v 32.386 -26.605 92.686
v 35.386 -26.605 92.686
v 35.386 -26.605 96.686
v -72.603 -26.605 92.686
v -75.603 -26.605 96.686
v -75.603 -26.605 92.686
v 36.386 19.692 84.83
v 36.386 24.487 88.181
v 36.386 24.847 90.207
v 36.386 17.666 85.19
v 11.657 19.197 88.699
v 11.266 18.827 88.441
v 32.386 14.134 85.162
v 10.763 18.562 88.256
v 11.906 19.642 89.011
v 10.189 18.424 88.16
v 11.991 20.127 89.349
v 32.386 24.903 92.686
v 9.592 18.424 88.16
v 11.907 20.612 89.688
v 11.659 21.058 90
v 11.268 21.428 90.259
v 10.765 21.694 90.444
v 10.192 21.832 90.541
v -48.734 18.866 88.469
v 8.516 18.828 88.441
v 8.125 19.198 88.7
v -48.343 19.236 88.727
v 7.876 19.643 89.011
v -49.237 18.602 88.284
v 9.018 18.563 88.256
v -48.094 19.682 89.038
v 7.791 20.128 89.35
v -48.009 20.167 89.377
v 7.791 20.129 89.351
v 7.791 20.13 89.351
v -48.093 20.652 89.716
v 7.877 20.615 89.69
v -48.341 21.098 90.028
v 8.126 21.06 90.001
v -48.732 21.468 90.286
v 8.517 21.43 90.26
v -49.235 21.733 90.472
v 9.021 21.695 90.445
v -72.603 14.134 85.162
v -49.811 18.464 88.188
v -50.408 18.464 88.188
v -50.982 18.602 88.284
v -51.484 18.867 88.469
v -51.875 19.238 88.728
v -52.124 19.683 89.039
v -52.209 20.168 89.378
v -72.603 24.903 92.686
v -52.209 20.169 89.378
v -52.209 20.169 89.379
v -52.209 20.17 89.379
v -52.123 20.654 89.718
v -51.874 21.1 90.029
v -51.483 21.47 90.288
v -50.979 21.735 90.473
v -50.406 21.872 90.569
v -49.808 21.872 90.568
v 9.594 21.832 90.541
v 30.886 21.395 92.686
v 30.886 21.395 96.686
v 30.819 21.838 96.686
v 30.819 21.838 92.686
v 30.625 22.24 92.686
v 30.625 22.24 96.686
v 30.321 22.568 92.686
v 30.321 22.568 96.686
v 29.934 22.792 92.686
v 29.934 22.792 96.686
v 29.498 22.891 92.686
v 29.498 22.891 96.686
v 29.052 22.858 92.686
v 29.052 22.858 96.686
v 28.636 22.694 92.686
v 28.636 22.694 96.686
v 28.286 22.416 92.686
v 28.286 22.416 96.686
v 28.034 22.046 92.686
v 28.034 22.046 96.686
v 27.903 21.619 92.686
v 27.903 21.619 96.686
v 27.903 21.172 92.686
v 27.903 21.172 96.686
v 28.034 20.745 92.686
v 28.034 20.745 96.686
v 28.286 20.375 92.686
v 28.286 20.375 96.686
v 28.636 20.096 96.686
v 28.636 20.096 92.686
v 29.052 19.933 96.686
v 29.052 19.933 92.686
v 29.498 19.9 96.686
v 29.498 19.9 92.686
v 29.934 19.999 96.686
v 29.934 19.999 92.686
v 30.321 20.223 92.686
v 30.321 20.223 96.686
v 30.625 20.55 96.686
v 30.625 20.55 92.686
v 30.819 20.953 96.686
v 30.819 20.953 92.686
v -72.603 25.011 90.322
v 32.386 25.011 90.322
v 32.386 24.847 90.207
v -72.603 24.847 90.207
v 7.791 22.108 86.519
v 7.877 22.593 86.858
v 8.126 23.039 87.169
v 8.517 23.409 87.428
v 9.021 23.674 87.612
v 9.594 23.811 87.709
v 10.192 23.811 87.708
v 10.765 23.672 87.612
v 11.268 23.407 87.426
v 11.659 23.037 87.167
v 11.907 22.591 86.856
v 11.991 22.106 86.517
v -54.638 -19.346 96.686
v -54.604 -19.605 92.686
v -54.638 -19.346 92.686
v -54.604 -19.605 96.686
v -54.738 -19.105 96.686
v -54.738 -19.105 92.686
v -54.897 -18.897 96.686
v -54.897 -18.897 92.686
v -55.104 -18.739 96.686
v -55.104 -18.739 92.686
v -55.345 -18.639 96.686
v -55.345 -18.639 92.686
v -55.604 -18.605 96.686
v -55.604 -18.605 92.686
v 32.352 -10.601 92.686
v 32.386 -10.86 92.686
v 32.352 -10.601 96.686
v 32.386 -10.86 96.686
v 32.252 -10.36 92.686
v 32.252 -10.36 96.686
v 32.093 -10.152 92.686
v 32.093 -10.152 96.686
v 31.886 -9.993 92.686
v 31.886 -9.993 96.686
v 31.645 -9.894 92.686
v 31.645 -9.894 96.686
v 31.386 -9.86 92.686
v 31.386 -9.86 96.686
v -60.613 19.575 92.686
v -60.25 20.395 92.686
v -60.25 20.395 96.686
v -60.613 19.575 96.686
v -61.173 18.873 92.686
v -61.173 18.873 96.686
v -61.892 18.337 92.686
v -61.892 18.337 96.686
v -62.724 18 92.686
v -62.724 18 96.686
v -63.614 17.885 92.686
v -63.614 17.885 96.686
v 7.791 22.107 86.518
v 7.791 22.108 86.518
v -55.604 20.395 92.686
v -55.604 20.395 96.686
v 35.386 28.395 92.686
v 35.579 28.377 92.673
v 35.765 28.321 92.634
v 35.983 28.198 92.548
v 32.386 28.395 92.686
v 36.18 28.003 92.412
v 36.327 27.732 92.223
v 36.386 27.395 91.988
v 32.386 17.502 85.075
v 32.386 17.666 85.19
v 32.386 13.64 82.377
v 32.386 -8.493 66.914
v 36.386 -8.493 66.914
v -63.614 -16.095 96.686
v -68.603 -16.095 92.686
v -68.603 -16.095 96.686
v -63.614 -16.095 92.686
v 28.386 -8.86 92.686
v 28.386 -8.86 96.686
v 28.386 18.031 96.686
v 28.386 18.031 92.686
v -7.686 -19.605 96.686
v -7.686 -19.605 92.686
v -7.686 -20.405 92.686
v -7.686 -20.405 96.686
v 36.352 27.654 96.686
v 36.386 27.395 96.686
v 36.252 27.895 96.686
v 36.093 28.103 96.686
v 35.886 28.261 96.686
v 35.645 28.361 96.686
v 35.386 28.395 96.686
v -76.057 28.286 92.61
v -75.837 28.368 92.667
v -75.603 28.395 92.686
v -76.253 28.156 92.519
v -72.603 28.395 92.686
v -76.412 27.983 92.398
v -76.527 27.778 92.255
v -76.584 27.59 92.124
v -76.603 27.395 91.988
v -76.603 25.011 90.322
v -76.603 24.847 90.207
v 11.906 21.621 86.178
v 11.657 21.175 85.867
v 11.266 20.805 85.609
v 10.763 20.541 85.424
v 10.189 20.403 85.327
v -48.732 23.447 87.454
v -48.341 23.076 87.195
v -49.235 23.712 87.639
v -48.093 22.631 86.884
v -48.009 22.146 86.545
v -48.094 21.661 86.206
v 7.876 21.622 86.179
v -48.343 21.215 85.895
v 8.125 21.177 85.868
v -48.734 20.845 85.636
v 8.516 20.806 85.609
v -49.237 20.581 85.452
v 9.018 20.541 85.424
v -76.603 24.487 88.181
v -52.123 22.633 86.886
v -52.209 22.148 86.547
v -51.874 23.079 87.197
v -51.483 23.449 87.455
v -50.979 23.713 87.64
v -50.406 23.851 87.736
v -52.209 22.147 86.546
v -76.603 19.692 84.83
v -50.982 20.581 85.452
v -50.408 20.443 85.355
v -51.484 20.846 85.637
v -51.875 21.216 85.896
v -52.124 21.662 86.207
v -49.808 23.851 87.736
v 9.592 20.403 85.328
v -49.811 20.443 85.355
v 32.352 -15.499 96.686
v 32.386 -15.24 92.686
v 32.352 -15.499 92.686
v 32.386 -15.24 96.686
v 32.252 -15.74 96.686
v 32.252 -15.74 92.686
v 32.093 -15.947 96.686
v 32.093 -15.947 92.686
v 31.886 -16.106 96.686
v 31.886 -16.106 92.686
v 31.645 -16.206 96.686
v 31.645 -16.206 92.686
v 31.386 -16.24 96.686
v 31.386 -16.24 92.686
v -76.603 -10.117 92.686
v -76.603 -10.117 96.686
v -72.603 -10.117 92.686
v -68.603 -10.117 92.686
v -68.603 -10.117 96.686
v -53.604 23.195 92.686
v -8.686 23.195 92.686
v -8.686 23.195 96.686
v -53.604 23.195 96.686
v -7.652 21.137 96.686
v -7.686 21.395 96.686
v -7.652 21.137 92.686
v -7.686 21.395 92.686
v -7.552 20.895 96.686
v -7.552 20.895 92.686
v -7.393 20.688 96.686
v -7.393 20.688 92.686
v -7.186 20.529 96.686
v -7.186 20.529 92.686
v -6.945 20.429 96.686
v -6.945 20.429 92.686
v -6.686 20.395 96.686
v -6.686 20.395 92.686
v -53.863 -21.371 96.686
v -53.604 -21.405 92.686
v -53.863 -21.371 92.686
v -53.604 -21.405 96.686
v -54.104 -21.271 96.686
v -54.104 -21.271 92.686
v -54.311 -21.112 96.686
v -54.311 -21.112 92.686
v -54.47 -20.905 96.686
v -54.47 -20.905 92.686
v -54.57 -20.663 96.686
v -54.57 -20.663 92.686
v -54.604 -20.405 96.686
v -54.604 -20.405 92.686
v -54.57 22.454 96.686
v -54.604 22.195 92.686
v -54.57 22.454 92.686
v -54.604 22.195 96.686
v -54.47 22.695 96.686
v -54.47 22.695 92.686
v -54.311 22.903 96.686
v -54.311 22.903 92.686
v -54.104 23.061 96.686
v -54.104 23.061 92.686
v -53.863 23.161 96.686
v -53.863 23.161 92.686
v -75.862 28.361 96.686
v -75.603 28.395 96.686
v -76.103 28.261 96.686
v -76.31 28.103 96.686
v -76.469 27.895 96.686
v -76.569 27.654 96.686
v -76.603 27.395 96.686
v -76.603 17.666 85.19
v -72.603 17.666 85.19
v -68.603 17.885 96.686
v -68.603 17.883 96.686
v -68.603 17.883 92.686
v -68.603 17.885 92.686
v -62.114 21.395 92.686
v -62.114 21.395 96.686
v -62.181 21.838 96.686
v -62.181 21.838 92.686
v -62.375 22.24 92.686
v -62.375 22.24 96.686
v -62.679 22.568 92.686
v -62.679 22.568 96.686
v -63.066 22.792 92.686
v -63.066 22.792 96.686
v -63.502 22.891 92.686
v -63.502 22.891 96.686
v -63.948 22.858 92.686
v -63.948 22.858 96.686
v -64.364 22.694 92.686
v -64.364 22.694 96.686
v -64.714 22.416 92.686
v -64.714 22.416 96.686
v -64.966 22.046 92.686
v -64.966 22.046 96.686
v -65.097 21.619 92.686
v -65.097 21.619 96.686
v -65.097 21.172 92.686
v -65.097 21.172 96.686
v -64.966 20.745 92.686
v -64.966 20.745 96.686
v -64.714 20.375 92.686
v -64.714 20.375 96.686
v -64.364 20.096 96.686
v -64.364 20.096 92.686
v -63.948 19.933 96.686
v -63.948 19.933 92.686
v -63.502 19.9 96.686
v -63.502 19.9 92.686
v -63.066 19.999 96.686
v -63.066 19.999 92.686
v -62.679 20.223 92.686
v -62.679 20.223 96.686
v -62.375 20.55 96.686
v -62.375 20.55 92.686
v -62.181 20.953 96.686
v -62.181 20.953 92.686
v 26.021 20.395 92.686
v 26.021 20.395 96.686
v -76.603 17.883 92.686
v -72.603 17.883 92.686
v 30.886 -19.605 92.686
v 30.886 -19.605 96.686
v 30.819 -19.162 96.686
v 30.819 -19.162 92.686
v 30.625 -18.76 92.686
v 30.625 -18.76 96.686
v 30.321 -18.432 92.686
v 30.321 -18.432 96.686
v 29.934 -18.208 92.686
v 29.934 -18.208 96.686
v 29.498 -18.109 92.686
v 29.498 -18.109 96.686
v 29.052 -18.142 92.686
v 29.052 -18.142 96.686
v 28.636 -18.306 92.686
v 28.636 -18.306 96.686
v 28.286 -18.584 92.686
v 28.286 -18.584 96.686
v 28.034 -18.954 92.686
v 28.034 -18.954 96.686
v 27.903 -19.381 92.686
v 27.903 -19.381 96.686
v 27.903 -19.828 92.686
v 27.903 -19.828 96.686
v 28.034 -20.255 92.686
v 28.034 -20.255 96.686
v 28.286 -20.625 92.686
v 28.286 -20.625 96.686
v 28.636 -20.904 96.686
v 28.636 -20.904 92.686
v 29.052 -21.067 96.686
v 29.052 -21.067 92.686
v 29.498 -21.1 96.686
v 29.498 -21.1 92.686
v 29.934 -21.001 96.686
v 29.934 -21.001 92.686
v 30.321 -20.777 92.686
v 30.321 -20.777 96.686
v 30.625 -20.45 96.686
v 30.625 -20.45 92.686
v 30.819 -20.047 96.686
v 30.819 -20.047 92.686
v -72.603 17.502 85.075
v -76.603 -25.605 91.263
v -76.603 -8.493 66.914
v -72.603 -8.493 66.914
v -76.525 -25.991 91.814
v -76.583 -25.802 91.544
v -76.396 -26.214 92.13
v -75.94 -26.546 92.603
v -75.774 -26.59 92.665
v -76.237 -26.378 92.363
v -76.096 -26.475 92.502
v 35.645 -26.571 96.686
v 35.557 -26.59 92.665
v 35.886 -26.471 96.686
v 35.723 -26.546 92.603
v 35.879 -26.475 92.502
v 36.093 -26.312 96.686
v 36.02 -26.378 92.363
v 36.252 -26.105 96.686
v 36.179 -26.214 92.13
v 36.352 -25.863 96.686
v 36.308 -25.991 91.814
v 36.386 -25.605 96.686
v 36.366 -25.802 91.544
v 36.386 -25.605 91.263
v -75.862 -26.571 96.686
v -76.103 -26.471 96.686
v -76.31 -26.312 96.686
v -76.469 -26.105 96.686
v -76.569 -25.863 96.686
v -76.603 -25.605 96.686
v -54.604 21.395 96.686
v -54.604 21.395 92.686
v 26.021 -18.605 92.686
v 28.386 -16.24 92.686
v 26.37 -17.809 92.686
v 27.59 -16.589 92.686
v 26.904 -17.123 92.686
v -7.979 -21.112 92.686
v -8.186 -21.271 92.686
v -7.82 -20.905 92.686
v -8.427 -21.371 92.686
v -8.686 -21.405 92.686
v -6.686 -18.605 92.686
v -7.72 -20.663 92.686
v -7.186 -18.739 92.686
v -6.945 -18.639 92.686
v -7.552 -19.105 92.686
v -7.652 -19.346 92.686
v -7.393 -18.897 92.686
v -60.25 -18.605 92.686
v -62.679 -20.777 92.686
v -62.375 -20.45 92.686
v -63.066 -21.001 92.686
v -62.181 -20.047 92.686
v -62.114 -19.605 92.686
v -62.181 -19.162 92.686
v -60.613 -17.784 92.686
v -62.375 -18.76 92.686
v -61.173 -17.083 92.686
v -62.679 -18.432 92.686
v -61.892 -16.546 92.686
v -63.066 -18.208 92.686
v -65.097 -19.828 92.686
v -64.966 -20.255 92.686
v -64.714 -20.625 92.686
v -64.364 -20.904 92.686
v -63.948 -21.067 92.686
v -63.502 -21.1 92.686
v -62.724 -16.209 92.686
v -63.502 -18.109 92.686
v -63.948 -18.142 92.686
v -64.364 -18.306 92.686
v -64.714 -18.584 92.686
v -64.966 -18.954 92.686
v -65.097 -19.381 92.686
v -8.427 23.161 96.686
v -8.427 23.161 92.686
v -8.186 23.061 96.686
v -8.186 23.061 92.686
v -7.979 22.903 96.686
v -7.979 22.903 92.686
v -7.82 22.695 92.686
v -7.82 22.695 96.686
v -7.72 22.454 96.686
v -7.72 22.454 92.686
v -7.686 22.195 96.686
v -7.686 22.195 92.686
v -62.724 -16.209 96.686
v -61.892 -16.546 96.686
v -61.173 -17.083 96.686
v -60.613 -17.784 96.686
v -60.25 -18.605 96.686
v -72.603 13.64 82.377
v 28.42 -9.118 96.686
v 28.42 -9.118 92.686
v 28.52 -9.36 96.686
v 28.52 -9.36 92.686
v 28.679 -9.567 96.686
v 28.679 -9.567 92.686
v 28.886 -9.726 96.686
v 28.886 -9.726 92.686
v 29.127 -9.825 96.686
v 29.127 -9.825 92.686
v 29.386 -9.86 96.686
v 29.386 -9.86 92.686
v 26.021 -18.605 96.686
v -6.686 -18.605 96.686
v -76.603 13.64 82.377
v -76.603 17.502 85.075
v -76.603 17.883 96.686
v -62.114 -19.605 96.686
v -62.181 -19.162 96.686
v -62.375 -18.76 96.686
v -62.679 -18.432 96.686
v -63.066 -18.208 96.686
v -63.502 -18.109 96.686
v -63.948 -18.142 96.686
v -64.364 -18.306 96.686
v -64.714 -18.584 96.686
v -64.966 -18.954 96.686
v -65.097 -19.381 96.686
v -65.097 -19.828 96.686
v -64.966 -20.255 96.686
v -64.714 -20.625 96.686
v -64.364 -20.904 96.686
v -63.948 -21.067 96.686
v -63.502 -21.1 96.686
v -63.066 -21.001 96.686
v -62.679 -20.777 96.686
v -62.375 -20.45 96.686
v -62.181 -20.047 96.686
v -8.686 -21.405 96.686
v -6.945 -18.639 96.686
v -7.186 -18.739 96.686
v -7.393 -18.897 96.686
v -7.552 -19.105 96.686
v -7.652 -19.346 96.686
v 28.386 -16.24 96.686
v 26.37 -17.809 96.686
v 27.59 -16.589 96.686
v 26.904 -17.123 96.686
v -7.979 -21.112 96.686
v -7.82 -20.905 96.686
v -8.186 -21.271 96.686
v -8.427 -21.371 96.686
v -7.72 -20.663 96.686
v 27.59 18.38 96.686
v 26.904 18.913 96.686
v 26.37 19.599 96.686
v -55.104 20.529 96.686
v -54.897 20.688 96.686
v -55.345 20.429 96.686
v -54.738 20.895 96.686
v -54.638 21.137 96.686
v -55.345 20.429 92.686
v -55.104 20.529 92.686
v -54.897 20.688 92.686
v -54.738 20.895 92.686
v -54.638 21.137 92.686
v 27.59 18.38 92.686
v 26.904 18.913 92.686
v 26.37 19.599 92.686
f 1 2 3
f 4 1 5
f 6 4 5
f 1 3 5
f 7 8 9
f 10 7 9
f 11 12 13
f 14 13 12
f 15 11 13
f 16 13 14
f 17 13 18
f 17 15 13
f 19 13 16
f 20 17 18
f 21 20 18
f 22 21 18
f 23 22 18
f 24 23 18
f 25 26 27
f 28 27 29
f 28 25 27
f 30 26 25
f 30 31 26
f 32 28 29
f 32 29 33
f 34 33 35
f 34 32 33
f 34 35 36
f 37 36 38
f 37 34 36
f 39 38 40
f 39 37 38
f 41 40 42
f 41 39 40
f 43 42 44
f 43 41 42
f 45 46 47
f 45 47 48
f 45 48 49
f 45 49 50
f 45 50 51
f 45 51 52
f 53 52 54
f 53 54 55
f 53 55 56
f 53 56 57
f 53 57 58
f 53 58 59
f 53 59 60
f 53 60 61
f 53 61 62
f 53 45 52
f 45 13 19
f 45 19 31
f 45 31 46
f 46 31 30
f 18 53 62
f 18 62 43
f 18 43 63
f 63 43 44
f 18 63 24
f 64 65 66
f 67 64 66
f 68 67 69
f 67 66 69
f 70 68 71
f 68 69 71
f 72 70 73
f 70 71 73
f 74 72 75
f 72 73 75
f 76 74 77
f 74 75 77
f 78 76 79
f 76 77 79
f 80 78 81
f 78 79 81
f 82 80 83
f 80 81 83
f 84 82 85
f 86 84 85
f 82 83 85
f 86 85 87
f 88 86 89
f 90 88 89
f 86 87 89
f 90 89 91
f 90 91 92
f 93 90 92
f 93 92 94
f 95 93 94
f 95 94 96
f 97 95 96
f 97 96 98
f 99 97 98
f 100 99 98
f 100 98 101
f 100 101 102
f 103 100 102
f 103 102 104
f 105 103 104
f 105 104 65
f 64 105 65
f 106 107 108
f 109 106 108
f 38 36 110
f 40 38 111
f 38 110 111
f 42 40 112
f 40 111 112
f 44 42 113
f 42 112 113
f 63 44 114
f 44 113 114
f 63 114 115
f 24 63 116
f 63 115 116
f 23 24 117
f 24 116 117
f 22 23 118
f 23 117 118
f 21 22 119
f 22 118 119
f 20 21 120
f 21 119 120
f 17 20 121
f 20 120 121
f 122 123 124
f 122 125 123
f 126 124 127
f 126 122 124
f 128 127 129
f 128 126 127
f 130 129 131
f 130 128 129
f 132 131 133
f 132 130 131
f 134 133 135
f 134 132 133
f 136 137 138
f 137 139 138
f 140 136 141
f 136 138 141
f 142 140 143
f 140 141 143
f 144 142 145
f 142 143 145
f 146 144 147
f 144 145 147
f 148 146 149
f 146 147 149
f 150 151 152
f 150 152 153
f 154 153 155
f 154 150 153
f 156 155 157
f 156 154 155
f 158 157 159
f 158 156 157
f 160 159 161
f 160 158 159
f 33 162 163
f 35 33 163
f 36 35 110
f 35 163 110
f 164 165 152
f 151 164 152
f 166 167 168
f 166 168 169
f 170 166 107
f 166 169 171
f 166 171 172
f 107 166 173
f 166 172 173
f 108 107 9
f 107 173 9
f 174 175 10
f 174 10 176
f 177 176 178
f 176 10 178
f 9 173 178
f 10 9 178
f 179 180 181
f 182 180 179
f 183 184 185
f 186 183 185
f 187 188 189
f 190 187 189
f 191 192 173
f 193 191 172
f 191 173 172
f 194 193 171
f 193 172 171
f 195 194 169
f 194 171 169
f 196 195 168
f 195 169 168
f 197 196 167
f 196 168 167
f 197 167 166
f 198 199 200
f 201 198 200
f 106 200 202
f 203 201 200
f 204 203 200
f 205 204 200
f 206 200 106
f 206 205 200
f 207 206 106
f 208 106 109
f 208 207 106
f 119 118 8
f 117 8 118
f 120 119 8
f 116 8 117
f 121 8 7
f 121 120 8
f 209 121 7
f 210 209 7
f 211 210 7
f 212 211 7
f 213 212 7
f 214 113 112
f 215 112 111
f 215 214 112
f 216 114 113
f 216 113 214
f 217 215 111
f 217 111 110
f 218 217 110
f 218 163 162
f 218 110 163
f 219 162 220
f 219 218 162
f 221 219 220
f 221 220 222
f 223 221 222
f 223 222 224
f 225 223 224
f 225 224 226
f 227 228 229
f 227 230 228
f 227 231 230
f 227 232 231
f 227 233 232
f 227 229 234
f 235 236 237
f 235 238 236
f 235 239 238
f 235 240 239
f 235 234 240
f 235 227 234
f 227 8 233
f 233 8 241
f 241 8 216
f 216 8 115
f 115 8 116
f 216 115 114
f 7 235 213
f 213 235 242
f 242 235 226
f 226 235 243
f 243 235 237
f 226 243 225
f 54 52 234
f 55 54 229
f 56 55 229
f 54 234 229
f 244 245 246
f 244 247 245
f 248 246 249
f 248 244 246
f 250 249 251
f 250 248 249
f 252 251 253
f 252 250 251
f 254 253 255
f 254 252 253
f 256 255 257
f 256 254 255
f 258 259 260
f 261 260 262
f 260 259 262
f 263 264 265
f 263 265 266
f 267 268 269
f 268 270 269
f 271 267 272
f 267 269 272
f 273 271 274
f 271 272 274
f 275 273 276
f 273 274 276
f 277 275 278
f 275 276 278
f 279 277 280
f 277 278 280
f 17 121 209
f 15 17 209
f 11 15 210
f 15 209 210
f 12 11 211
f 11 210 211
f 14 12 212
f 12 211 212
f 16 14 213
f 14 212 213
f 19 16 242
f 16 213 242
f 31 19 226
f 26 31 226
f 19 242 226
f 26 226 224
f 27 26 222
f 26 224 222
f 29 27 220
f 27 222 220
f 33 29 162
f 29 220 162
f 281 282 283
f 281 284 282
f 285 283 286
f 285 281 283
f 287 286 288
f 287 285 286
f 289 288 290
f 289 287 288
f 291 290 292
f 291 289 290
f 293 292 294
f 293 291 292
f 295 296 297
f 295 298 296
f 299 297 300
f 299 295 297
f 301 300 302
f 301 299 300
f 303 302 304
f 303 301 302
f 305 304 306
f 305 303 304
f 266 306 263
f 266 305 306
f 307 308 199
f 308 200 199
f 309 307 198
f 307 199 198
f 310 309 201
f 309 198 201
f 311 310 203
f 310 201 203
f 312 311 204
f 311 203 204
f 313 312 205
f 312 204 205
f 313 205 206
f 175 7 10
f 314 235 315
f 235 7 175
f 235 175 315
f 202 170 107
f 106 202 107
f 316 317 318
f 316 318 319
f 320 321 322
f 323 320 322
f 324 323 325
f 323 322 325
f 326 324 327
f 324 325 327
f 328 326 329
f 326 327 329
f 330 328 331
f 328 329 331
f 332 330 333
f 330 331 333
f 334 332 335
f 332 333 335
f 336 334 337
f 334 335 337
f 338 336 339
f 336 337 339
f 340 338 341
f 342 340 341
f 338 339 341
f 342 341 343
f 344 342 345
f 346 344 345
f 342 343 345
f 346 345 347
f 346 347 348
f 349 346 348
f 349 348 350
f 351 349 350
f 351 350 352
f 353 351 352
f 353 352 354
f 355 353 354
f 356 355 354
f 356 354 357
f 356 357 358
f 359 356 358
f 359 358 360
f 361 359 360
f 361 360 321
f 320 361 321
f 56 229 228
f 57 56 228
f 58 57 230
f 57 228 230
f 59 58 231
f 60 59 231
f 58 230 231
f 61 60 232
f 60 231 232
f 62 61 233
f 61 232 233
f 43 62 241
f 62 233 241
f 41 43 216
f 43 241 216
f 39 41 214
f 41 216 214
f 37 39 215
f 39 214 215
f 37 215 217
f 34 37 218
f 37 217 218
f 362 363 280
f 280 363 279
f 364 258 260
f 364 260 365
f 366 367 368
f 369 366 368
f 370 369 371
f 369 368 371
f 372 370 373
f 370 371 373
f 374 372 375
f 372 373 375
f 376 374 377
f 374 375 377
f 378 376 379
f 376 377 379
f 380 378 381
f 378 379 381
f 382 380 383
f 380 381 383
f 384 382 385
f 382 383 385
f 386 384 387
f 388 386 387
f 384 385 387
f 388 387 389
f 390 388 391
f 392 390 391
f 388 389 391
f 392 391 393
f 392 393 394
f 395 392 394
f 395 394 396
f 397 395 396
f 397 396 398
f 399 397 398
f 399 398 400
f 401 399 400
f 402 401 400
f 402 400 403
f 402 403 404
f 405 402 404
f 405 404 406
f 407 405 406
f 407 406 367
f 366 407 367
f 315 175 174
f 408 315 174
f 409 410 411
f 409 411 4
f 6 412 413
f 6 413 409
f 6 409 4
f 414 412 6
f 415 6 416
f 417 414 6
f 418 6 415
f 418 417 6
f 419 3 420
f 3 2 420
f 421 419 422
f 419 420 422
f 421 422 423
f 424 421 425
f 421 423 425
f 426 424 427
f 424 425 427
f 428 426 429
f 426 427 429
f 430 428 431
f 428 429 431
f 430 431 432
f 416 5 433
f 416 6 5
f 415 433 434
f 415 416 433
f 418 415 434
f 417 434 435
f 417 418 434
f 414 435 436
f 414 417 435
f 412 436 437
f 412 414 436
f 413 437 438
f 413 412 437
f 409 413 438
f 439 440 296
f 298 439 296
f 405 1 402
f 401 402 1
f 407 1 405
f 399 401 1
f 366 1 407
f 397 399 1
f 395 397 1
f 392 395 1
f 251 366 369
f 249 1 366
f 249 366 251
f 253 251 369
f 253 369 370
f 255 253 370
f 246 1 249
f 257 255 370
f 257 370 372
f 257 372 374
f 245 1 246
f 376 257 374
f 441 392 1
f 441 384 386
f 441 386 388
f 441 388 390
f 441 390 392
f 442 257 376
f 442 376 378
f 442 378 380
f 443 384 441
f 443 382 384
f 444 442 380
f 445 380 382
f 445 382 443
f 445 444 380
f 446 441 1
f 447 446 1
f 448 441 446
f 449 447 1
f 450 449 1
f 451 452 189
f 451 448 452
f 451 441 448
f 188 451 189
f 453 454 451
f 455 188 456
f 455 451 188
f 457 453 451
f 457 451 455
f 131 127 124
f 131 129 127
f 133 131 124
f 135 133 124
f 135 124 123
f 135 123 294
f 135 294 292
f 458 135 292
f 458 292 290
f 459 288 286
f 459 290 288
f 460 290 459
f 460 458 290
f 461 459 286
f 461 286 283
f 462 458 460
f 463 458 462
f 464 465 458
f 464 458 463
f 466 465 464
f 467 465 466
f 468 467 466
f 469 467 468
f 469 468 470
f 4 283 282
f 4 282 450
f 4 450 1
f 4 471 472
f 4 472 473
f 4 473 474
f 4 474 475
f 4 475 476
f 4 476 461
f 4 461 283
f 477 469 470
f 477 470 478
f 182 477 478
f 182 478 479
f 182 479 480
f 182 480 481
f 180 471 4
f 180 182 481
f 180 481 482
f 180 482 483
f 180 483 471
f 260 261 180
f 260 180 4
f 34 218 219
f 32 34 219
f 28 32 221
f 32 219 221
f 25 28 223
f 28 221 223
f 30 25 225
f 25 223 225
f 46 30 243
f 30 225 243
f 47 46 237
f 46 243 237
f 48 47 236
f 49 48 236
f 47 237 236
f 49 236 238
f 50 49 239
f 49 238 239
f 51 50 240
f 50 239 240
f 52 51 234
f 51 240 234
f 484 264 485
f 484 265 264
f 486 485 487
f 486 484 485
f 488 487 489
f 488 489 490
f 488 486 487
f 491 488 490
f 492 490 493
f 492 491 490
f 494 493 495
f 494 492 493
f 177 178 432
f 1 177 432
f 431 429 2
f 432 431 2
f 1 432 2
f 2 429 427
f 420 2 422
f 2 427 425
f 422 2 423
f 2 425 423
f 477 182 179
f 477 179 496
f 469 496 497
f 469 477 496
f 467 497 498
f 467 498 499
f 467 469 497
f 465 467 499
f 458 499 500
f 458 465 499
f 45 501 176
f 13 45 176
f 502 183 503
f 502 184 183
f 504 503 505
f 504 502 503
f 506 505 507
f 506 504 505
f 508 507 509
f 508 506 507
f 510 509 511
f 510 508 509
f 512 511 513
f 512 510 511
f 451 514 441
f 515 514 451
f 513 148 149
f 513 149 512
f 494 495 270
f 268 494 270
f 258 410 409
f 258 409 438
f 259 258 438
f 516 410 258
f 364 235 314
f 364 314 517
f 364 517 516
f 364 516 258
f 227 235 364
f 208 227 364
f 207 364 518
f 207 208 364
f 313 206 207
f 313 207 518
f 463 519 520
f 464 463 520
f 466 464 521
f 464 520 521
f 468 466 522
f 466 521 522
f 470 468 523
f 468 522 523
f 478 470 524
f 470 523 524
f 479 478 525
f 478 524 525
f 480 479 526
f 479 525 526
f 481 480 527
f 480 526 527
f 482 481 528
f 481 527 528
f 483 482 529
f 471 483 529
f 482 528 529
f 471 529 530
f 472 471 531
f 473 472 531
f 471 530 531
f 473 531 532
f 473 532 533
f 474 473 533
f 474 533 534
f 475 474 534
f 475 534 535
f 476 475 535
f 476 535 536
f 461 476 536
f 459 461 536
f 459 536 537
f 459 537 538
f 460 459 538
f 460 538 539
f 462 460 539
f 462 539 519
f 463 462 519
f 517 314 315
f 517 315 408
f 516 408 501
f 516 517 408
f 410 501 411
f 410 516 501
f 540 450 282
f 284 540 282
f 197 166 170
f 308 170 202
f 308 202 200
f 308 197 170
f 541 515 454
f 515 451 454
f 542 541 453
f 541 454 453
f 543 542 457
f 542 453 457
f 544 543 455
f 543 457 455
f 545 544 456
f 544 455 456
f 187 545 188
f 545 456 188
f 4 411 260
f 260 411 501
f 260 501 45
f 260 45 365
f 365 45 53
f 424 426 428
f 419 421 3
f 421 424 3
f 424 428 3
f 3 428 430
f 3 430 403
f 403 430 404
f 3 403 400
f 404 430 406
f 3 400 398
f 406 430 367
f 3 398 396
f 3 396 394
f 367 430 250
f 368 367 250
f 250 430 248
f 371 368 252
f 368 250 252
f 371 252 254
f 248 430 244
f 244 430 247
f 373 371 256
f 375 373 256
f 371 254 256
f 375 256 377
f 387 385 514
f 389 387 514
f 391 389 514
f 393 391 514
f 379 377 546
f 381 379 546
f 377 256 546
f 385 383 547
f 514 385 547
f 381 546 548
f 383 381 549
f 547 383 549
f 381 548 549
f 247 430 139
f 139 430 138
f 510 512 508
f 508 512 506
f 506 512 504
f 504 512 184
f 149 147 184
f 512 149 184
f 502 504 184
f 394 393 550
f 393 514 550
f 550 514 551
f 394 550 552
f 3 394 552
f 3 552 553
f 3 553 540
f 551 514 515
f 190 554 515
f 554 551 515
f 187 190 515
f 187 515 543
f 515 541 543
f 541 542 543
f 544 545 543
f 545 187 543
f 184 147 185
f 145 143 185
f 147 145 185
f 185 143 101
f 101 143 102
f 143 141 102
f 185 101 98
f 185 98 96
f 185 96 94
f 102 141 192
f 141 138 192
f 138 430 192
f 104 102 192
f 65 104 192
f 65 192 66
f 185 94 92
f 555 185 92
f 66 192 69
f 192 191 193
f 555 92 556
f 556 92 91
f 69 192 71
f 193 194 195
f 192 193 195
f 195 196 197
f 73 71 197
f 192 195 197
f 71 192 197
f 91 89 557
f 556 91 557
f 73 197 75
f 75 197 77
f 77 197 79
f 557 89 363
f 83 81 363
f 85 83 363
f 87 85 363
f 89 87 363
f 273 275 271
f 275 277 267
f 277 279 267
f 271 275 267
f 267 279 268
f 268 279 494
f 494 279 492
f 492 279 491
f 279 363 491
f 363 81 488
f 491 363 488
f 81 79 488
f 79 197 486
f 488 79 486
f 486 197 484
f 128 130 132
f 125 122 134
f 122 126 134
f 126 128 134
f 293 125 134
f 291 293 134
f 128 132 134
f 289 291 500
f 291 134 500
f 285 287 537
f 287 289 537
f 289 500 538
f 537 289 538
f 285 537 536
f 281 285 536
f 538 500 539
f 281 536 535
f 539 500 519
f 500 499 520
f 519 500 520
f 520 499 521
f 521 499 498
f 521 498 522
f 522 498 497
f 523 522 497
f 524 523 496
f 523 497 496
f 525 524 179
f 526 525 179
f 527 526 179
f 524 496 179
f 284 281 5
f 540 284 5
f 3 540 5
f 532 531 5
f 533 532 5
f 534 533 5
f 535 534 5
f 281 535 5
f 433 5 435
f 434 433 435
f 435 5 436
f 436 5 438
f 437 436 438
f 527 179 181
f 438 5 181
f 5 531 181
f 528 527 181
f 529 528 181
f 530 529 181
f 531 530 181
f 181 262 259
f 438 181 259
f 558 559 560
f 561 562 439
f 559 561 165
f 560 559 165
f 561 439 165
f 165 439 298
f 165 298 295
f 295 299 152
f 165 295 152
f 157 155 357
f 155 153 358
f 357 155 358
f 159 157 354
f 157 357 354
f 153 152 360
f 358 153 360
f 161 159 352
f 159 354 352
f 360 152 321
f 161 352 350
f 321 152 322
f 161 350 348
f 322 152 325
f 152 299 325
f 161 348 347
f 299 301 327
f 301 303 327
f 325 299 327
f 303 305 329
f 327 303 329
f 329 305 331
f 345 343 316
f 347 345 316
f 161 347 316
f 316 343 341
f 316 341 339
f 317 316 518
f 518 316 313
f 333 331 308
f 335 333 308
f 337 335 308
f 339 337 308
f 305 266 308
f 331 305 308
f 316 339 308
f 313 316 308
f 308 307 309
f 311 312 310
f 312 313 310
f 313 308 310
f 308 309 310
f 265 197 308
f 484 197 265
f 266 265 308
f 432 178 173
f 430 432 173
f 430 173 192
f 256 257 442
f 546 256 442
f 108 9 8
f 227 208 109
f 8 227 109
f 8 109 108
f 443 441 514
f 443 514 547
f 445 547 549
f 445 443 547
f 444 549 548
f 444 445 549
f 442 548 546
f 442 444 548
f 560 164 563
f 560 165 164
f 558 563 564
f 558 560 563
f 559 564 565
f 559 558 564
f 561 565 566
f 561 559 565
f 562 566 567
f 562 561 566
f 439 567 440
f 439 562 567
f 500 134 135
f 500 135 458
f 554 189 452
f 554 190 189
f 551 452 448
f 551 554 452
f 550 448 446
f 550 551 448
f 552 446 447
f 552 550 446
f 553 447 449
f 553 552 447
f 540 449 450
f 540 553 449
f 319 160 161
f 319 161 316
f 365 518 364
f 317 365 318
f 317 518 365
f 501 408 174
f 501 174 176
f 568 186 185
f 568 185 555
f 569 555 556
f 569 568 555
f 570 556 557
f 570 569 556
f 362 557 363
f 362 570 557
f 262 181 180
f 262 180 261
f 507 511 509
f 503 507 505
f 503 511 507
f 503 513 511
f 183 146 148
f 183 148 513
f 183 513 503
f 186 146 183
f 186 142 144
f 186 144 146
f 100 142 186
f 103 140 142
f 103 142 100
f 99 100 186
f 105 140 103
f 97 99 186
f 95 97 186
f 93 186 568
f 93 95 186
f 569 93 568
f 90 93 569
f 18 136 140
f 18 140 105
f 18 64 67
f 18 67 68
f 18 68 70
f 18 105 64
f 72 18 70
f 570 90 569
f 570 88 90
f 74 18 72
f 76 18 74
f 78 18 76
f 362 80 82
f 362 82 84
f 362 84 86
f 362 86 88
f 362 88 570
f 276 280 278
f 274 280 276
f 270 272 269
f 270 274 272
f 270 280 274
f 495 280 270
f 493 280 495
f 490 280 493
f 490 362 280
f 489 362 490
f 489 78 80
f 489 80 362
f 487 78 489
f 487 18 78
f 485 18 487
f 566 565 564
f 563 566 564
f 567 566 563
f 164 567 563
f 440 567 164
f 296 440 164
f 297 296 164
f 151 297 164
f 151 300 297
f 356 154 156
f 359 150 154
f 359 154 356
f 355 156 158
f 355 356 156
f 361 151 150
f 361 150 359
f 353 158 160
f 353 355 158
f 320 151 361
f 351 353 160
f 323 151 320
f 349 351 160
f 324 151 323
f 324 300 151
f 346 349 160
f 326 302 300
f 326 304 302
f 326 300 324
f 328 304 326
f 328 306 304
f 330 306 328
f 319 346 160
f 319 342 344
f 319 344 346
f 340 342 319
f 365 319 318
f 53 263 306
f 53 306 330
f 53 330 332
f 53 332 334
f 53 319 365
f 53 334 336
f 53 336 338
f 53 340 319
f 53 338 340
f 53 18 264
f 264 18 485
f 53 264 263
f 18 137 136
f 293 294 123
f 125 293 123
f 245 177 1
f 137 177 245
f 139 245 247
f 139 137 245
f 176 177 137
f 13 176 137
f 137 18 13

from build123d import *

# Parameters (mm, degrees)
SKETCH_1_W          = 112.98899933
SKETCH_1_H          = 54.999998897
SKETCH_1_W_2        = 96.98899933
SKETCH_1_H_2        = 38.999998897
EXTRUDE_1_DEPTH     = 4
EXTRUDE_1_2_DEPTH   = 4
SKETCH_2_R          = 1.5
SKETCH_2_W          = 8
SKETCH_2_H          = 28
CUT_EXTRUDE_1_DEPTH = 10
EXTRUDE_2_DEPTH     = 4
EXTRUDE_3_DEPTH     = 112.988999
CHAMFER_1_SIZE      = 2
CUT_EXTRUDE_2_DEPTH = 4
SKETCH_7_W          = 4
SKETCH_7_H          = 6.380551841
SKETCH_7_W_2        = 46.91800116
SKETCH_7_H_2        = 38.999998897
SKETCH_7_H_3        = 2.8
CUT_EXTRUDE_3_DEPTH = 4
FILLET_2_R          = 1
FILLET_4_R          = 1


with BuildPart() as part:
    # 스케치1 → Extrude 1 (new body)
    with BuildSketch(Plane(origin=(0, 0, 96.68635878), x_dir=(-1, 0, 0), z_dir=(0, 0, -1))):
        with Locations((20.108635155, 0.89540154)):
            Rectangle(SKETCH_1_W, SKETCH_1_H)
        with Locations((20.108635155, 0.89540154)):
            Rectangle(SKETCH_1_W_2, SKETCH_1_H_2, mode=Mode.SUBTRACT)
    extrude(amount=EXTRUDE_1_DEPTH)

    # 스케치3 → Extrude 1 2 (add)
    with BuildSketch(Plane(origin=(0, 0, 92.68635878), x_dir=(-1, 0, 0), z_dir=(0, 0, -1))):
        with BuildLine():
            Line((-28.38586451, 20.395400989), (-26.02132888, 20.395400989))
            ThreePointArc((-26.02132888, 20.395400989), (-25.912420969, 20.89013871), (-25.87586451, 21.395400989))
            ThreePointArc((-25.87586451, 21.395400989), (-32.199234375, 23.494222087), (-28.38586451, 18.03086536))
            Line((-28.38586451, 18.03086536), (-28.38586451, 20.395400989))
        make_face()
        with BuildLine():
            ThreePointArc((-28.38586451, 18.03086536), (-26.903919708, 18.913456187), (-26.02132888, 20.395400989))
            Line((-26.02132888, 20.395400989), (-28.38586451, 20.395400989))
            Line((-28.38586451, 20.395400989), (-28.38586451, 18.03086536))
        make_face()
        with BuildLine():
            Line((-28.38586451, -18.604597908), (-28.38586451, -16.24006219))
            ThreePointArc((-28.38586451, -16.24006219), (-32.199234375, -21.703418917), (-25.87586451, -19.604597819))
            ThreePointArc((-25.87586451, -19.604597819), (-25.912420962, -19.099335586), (-26.021328854, -18.604597908))
            Line((-26.021328854, -18.604597908), (-28.38586451, -18.604597908))
        make_face()
        with BuildLine():
            ThreePointArc((-26.021328854, -18.604597908), (-26.903919675, -17.12265305), (-28.38586451, -16.24006219))
            Line((-28.38586451, -16.24006219), (-28.38586451, -18.604597908))
            Line((-28.38586451, -18.604597908), (-26.021328854, -18.604597908))
        make_face()
        with BuildLine():
            ThreePointArc((66.978670192, -18.604597908), (65.712955672, -16.791227981), (63.614134537, -16.094597819))
            Line((63.614134537, -16.094597819), (63.614134537, -18.604597908))
            Line((63.614134537, -18.604597908), (66.978670192, -18.604597908))
        make_face()
        with BuildLine():
            Line((63.614134537, -18.604597908), (63.614134537, -16.094597819))
            ThreePointArc((63.614134537, -16.094597819), (61.515313402, -16.791227981), (60.249598881, -18.604597908))
            Line((60.249598881, -18.604597908), (63.614134537, -18.604597908))
        make_face()
        with BuildLine():
            Line((66.978670192, -18.604597908), (63.614134537, -18.604597908))
            Line((63.614134537, -18.604597908), (63.614134537, -23.114597819))
            ThreePointArc((63.614134537, -23.114597819), (66.096079339, -22.086542621), (67.124134537, -19.604597819))
            ThreePointArc((67.124134537, -19.604597819), (67.087578084, -19.099335586), (66.978670192, -18.604597908))
        make_face()
        with BuildLine():
            Line((63.614134537, -23.114597819), (63.614134537, -18.604597908))
            Line((63.614134537, -18.604597908), (60.249598881, -18.604597908))
            ThreePointArc((60.249598881, -18.604597908), (60.800764699, -21.703418954), (63.614134537, -23.114597819))
        make_face()
        with BuildLine():
            Line((68.60313482, -18.604597908), (68.60313482, -16.094597819))
            Line((68.60313482, -16.094597819), (63.614134537, -16.094597819))
            ThreePointArc((63.614134537, -16.094597819), (65.712955672, -16.791227981), (66.978670192, -18.604597908))
            Line((66.978670192, -18.604597908), (68.60313482, -18.604597908))
        make_face()
        with BuildLine():
            ThreePointArc((60.249598907, 20.395400989), (61.515313439, 18.582031123), (63.614134537, 17.885400989))
            Line((63.614134537, 17.885400989), (63.614134537, 20.395400989))
            Line((63.614134537, 20.395400989), (60.249598907, 20.395400989))
        make_face()
        with BuildLine():
            Line((63.614134537, 20.395400989), (63.614134537, 17.885400989))
            ThreePointArc((63.614134537, 17.885400989), (65.712955634, 18.582031123), (66.978670166, 20.395400989))
            Line((66.978670166, 20.395400989), (63.614134537, 20.395400989))
        make_face()
        with BuildLine():
            Line((60.249598907, 20.395400989), (63.614134537, 20.395400989))
            Line((63.614134537, 20.395400989), (63.614134537, 24.905400989))
            ThreePointArc((63.614134537, 24.905400989), (60.800764671, 23.494222087), (60.249598907, 20.395400989))
        make_face()
        with BuildLine():
            Line((63.614134537, 24.905400989), (63.614134537, 20.395400989))
            Line((63.614134537, 20.395400989), (66.978670166, 20.395400989))
            ThreePointArc((66.978670166, 20.395400989), (67.087578077, 20.89013871), (67.124134537, 21.395400989))
            ThreePointArc((67.124134537, 21.395400989), (66.096079339, 23.877345791), (63.614134537, 24.905400989))
        make_face()
        with BuildLine():
            ThreePointArc((66.978670166, 20.395400989), (65.712955634, 18.582031123), (63.614134537, 17.885400989))
            Line((63.614134537, 17.885400989), (68.60313482, 17.885400989))
            Line((68.60313482, 17.885400989), (68.60313482, 20.395400989))
            Line((68.60313482, 20.395400989), (66.978670166, 20.395400989))
        make_face()
    extrude(amount=-EXTRUDE_1_2_DEPTH)

    # 스케치2 → 컷-돌출1 (cut)
    with BuildSketch(Plane.XY.offset(96.68635878)):
        with Locations((-63.614134537, -19.604597819)):
            Circle(SKETCH_2_R)
        with Locations((29.38586451, -19.604597819)):
            Circle(SKETCH_2_R)
        with Locations((29.38586451, 21.395400989)):
            Circle(SKETCH_2_R)
        with Locations((-63.614134537, 21.395400989)):
            Circle(SKETCH_2_R)
        with Locations((-72.60313482, 3.882984922)):
            Rectangle(SKETCH_2_W, SKETCH_2_H)
    extrude(amount=-CUT_EXTRUDE_1_DEPTH, mode=Mode.SUBTRACT)

    # 스케치4 → 보스-돌출2 (add)
    with BuildSketch(Plane.ZY.offset(76.60313482)):
        Polygon((92.68635878, -26.604597908), (92.68635878, 28.395400989), (66.913727288, -8.493235012), align=None)
    extrude_2 = extrude(amount=-EXTRUDE_2_DEPTH)

    # 대칭 복사1: 보스-돌출2 across plane
    add(extrude_2.mirror(Plane.ZY.offset(20.108635155)))

    # 스케치5 → 보스-돌출3 (add)
    with BuildSketch(Plane.ZY.offset(76.60313482)):
        Polygon((84.830484946, 19.691692545), (85.189902425, 17.665644896), (90.206974689, 24.846632704), (88.18092704, 24.487215225), align=None)
        Polygon((85.189902425, 17.665644896), (85.075357396, 17.501695402), (82.377306183, 13.639946589), (84.016801117, 12.4944963), (95.126134542, 28.395400989), (92.68635878, 28.395400989), (90.321519717, 25.010582197), (90.206974689, 24.846632704), align=None)
    extrude(amount=-EXTRUDE_3_DEPTH)

    # 모따기1
    chamfer_1_edges = [part.edges().sort_by_distance(p)[0] for p in [
        (-20.108635155, 12.4944963, 84.016801117),
    ]]
    chamfer(chamfer_1_edges, length=CHAMFER_1_SIZE - 0.0001)  # a hair under: the kernel refuses the full size

    # 스케치6 → 컷-돌출2 (cut)
    with BuildSketch(Plane(origin=(0, -33.367910571, 47.759838088), x_dir=(-1, 0, 0), z_dir=(0, 0.5727251442659632, -0.8197474666783251))):
        with BuildLine():
            ThreePointArc((52.208634465, 67.723569041), (50.106933191, 69.821866387), (48.008635845, 67.720165113))
            Line((48.008635845, 67.720165113), (50.108635155, 67.721867077))
            Line((50.108635155, 67.721867077), (52.208634465, 67.723569041))
        make_face()
        with BuildLine():
            Line((50.108635155, 67.721867077), (48.008635845, 67.720165113))
            ThreePointArc((48.008635845, 67.720165113), (50.109486137, 65.62186725), (52.208635155, 67.721867077))
            ThreePointArc((52.208635155, 67.721867077), (52.208634983, 67.722718059), (52.208634465, 67.723569041))
            Line((52.208634465, 67.723569041), (50.108635155, 67.721867077))
        make_face()
        with BuildLine():
            ThreePointArc((-7.791365535, 67.674941484), (-9.893066809, 69.77323883), (-11.991364155, 67.671537556))
            Line((-11.991364155, 67.671537556), (-9.891364845, 67.67323952))
            Line((-9.891364845, 67.67323952), (-7.791365535, 67.674941484))
        make_face()
        with BuildLine():
            Line((-9.891364845, 67.67323952), (-11.991364155, 67.671537556))
            ThreePointArc((-11.991364155, 67.671537556), (-9.890513863, 65.573239692), (-7.791364845, 67.67323952))
            ThreePointArc((-7.791364845, 67.67323952), (-7.791365017, 67.674090502), (-7.791365535, 67.674941484))
            Line((-7.791365535, 67.674941484), (-9.891364845, 67.67323952))
        make_face()
    extrude(amount=-CUT_EXTRUDE_2_DEPTH, mode=Mode.SUBTRACT)

    # 스케치7 → 컷-돌출3 (cut)
    with BuildSketch(Plane(origin=(0, 0, 92.68635878), x_dir=(-1, 0, 0), z_dir=(0, 0, -1))):
        with Locations((-30.38586451, -13.04978627)):
            Rectangle(SKETCH_7_W, SKETCH_7_H)
        with Locations((31.145135519, 0.89540154)):
            Rectangle(SKETCH_7_W_2, SKETCH_7_H_2)
        with Locations((31.145135519, 21.795400989)):
            Rectangle(SKETCH_7_W_2, SKETCH_7_H_3)
        with Locations((31.145135519, -20.004597908)):
            Rectangle(SKETCH_7_W_2, SKETCH_7_H_3)
    extrude(amount=-CUT_EXTRUDE_3_DEPTH, mode=Mode.SUBTRACT)

    # 필렛2
    fillet_2_edges = [part.edges().sort_by_distance(p)[0] for p in [
        (-7.686134939, 20.395400989, 94.68635878),
        (-54.604136099, 20.395400989, 94.68635878),
        (28.38586451, -9.859510349, 94.68635878),
        (32.38586451, -16.24006219, 94.68635878),
        (32.38586451, -9.859510349, 94.68635878),
        (-54.604136099, -18.604597908, 94.68635878),
        (-7.686134939, -18.604597908, 94.68635878),
        (-7.686134939, -21.404597908, 94.68635878),
        (-54.604136099, 23.195400989, 94.68635878),
        (-54.604136099, -21.404597908, 94.68635878),
        (-7.686134939, 23.195400989, 94.68635878),
    ]]
    fillet(fillet_2_edges, radius=FILLET_2_R)

    # 필렛4
    fillet_4_edges = [part.edges().sort_by_distance(p)[0] for p in [
        (36.38586451, 28.395400989, 94.68635878),
        (-76.60313482, 28.395400989, 94.68635878),
        (-76.60313482, -26.604597908, 94.68635878),
        (36.38586451, -26.604597908, 94.68635878),
    ]]
    fillet(fillet_4_edges, radius=FILLET_4_R)


solid = part.part
